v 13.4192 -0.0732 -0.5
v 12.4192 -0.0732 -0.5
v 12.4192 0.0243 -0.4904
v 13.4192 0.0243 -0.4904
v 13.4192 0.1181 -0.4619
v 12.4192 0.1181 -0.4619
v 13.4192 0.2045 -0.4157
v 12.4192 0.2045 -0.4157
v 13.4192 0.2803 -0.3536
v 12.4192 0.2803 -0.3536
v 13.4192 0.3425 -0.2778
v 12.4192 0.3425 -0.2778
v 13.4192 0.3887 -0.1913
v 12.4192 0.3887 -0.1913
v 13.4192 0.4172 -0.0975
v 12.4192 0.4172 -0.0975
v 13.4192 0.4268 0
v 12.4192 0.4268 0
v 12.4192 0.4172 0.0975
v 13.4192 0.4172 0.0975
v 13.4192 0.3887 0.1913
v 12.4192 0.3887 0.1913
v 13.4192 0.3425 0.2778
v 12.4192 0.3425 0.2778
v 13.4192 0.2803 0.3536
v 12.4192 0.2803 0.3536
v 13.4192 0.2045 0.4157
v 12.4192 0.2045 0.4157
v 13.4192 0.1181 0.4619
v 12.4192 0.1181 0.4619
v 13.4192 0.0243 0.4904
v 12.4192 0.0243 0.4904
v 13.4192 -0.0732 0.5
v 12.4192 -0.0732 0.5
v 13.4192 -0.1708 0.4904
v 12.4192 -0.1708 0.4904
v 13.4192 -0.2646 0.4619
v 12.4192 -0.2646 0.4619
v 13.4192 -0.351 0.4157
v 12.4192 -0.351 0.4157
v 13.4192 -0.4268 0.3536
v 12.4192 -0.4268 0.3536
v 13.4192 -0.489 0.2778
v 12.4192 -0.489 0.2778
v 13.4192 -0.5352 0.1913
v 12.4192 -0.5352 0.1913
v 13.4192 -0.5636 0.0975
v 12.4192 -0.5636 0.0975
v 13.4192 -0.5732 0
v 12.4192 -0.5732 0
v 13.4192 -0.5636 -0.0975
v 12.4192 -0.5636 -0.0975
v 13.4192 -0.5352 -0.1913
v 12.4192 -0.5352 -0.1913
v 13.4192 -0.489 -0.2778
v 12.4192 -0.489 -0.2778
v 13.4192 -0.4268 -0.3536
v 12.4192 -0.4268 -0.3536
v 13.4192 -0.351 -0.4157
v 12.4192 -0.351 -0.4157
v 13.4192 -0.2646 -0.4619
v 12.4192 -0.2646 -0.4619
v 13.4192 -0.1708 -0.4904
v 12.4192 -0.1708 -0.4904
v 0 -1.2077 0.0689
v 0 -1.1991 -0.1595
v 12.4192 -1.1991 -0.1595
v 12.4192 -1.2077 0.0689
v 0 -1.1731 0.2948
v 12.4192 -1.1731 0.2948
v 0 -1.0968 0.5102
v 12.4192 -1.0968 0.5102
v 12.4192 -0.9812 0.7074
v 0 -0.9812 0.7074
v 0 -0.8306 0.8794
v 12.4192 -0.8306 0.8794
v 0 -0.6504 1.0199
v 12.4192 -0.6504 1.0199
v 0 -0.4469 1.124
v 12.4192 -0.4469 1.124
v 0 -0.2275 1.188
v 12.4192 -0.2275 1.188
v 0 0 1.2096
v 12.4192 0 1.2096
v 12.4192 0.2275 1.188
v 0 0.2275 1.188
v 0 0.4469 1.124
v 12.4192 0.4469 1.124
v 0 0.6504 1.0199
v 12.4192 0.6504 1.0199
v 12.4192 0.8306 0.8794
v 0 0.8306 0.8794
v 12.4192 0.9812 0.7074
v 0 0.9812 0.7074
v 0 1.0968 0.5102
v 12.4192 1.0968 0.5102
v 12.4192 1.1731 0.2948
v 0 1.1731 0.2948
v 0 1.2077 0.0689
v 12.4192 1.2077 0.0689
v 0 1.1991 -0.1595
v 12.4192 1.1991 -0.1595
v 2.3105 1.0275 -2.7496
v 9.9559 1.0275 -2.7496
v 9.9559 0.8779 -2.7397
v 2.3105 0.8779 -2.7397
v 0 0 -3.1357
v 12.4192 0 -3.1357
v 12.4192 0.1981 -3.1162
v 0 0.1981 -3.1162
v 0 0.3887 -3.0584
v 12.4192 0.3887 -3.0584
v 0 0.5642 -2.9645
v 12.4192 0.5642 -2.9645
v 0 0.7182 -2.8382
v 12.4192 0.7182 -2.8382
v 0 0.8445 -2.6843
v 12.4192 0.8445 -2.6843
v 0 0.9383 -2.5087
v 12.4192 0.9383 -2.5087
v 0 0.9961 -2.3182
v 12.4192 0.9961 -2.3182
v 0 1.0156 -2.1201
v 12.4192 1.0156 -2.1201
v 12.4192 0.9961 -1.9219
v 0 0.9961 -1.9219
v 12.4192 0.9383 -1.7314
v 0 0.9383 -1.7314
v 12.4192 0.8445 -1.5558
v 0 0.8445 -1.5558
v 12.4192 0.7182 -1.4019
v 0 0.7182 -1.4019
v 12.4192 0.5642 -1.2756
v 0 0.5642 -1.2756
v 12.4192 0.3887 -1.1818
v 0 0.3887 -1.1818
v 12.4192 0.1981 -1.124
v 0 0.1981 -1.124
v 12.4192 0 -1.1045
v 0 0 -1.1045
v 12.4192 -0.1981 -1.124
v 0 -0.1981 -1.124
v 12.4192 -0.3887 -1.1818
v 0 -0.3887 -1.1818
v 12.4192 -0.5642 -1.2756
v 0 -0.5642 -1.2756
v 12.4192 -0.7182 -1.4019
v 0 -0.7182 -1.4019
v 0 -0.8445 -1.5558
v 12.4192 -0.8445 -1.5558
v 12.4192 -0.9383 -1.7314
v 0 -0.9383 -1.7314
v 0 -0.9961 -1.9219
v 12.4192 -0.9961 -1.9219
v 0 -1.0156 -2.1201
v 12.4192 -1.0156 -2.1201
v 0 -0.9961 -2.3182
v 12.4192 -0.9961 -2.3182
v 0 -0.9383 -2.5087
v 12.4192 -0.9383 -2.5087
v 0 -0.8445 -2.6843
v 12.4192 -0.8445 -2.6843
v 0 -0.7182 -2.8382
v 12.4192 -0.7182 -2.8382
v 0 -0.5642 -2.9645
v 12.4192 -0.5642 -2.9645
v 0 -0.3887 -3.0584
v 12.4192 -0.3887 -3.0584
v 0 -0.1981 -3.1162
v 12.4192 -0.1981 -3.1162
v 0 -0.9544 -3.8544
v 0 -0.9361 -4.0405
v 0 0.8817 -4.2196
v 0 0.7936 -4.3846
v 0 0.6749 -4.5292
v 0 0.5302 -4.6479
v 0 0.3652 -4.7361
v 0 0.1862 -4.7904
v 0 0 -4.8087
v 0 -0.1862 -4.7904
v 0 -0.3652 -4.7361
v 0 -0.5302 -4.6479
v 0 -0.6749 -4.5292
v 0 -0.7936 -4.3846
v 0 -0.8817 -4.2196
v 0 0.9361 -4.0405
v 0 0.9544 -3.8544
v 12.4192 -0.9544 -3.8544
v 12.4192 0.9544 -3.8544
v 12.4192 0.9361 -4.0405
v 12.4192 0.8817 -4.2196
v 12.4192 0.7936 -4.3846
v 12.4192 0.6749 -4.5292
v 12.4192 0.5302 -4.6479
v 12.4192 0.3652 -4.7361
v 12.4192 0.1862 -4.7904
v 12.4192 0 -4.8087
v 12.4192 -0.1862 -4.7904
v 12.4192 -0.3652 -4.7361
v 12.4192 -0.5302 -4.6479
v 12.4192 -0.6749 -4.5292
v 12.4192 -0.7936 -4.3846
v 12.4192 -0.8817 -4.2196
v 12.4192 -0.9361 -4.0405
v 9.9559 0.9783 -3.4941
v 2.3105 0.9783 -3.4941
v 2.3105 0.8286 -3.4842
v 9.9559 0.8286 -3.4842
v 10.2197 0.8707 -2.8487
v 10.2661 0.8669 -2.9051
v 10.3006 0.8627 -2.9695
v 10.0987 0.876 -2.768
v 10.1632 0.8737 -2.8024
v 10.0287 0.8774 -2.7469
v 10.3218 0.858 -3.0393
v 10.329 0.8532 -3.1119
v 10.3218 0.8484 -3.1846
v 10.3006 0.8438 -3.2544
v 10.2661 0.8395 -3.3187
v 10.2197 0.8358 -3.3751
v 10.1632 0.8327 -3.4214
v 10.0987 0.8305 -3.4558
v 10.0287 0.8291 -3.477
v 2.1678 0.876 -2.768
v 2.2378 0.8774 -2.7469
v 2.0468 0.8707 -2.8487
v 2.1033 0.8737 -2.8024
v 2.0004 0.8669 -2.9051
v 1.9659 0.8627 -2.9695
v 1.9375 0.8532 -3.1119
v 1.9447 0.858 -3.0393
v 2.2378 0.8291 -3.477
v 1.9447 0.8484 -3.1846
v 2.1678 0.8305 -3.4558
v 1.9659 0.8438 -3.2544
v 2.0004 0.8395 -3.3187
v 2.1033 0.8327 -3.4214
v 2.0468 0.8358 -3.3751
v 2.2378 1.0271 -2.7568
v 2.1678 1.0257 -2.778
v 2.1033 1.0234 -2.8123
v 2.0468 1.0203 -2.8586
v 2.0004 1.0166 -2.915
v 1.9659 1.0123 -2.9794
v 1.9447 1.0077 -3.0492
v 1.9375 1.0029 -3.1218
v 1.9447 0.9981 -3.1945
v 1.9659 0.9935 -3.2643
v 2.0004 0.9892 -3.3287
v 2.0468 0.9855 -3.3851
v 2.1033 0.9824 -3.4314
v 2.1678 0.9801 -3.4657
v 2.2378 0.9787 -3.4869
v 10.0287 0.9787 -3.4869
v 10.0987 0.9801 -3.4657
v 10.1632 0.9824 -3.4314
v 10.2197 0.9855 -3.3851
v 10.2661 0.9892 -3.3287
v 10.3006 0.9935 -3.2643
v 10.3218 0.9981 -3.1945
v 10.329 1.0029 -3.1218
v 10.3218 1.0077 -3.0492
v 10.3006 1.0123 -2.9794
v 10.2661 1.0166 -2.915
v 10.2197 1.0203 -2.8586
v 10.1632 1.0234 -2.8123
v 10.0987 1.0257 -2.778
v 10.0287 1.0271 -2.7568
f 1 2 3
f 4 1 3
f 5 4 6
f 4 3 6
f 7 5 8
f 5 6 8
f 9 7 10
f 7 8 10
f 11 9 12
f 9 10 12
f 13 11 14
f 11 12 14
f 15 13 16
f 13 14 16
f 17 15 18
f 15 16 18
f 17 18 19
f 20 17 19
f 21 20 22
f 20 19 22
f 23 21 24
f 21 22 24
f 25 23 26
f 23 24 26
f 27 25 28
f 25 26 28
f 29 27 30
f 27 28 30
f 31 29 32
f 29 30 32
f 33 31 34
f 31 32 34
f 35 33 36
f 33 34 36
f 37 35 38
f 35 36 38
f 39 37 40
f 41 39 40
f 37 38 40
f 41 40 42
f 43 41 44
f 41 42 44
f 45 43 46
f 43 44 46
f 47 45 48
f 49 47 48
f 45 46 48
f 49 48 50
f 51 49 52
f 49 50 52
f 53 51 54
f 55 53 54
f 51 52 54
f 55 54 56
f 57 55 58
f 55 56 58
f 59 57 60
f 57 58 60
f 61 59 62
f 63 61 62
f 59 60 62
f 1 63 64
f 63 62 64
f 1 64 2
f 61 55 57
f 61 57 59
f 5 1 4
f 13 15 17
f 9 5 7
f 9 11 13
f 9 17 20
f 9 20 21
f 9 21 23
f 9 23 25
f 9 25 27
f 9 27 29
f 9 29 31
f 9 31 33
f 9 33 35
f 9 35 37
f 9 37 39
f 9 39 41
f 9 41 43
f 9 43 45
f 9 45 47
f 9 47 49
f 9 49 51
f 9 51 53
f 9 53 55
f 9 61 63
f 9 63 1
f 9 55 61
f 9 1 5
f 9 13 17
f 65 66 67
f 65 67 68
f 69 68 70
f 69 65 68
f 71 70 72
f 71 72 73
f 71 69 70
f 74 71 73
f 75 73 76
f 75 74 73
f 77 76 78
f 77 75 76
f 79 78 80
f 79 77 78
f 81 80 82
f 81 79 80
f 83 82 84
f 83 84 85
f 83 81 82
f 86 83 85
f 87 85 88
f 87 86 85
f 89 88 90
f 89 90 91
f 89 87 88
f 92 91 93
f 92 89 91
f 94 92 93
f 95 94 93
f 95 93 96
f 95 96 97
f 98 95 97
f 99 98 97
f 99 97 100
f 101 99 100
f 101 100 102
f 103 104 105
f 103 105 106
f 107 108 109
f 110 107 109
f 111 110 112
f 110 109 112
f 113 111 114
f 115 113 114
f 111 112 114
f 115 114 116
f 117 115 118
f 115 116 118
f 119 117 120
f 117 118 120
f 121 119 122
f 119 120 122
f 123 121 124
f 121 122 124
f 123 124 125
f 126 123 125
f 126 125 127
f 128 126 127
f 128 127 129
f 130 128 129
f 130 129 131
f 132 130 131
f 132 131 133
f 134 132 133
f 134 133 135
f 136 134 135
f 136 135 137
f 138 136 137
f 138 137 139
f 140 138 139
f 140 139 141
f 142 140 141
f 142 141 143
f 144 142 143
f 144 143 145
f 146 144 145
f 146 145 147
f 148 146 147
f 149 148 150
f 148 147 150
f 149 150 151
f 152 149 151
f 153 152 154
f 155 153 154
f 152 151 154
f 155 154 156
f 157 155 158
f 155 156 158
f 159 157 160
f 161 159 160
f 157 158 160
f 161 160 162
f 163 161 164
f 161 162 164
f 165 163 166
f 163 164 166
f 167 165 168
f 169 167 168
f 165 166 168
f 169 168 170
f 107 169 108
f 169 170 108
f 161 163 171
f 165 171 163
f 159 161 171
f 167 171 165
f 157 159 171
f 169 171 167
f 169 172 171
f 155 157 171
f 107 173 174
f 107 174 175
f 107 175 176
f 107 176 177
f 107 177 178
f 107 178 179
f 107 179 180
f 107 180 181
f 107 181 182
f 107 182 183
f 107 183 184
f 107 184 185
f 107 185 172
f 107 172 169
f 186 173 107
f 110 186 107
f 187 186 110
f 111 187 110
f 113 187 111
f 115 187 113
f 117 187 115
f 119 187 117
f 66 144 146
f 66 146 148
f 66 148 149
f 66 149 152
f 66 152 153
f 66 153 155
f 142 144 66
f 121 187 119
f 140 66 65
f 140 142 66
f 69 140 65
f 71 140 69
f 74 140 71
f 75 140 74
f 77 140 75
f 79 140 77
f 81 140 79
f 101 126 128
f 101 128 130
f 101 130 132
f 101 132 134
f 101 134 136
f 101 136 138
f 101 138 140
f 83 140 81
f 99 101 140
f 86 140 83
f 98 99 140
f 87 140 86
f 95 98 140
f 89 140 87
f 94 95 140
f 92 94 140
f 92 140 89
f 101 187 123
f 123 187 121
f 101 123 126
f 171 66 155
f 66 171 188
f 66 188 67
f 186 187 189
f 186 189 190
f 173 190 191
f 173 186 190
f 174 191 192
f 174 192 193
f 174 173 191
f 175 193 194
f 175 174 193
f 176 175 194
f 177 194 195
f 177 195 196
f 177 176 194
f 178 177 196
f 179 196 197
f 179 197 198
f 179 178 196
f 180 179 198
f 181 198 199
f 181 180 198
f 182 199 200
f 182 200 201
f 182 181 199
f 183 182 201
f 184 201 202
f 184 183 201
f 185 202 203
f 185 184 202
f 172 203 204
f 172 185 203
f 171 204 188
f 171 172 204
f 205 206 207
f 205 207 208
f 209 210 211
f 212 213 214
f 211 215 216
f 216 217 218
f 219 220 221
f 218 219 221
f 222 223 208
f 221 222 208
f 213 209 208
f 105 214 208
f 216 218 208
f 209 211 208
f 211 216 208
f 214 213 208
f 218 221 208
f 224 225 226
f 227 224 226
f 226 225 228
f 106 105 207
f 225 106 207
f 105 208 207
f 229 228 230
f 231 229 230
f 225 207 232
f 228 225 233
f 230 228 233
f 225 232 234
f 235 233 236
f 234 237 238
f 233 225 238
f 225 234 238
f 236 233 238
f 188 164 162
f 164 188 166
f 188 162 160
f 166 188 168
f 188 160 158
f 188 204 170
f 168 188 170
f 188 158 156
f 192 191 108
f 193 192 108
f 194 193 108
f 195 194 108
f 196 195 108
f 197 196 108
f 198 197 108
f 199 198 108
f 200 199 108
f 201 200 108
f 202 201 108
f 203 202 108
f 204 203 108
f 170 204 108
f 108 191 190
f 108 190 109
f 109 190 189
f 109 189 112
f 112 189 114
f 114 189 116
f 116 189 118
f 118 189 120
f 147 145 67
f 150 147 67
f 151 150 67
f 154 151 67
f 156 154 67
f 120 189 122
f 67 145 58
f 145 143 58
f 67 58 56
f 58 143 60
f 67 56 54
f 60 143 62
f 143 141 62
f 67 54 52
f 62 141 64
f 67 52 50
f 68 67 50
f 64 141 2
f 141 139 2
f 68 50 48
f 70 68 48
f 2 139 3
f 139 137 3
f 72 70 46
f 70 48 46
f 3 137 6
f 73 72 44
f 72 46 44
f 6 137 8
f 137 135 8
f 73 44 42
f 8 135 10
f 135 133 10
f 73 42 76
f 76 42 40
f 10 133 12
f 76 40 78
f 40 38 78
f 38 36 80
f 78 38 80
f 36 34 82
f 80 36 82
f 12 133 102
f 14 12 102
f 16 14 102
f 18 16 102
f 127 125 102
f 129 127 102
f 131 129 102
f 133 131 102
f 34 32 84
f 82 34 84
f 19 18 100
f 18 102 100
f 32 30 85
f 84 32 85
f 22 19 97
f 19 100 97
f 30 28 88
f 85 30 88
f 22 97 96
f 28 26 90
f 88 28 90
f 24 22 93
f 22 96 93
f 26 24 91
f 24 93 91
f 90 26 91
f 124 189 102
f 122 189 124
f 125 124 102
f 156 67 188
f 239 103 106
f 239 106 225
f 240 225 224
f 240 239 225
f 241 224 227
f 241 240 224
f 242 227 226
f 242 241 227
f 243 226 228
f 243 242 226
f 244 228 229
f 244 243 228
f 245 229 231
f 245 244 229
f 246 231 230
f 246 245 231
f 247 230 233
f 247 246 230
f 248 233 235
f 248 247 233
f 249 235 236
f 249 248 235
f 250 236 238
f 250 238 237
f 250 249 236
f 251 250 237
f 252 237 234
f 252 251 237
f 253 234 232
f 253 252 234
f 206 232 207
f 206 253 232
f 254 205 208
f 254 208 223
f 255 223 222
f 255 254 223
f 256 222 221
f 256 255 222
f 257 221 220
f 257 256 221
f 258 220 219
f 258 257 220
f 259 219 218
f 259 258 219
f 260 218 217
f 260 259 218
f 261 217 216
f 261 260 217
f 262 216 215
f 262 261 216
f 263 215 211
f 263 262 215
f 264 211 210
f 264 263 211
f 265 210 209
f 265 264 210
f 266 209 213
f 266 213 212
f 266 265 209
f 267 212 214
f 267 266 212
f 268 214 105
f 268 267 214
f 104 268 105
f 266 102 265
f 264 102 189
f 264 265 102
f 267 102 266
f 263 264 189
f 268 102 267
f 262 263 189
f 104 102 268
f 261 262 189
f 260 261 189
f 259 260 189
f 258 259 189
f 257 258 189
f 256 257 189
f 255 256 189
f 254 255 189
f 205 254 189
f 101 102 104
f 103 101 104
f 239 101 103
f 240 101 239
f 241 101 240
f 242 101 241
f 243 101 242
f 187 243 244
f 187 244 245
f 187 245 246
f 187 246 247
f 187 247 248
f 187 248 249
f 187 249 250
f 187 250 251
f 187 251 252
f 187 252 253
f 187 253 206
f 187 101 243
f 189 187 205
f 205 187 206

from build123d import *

# Parameters (mm, degrees)
BOSS_EXTRUDE1_DEPTH = 12.419249514
SKETCH3_R           = 1.015618984
CUT_EXTRUDE1_DEPTH  = 13.419249514
SKETCH4_R           = 0.5
BOSS_EXTRUDE4_DEPTH = 1
CUT_EXTRUDE4_DEPTH  = 0.15


with BuildPart() as part:
    # Sketch2 → Boss-Extrude1 (new body)
    with BuildSketch(Plane(origin=(0, 0, 0), x_dir=(0, 0, -1), z_dir=(1, 0, 0))):
        with BuildLine():
            Line((0.159499861, 1.199062904), (3.854352819, 0.954395011))
            ThreePointArc((3.854352819, 0.954395011), (4.80874783, 0), (3.854352819, -0.954395011))
            Line((3.854352819, -0.954395011), (0.159499861, -1.199062904))
            ThreePointArc((0.159499861, -1.199062904), (-1.209624757, 0), (0.159499861, 1.199062904))
        make_face()
    extrude(amount=BOSS_EXTRUDE1_DEPTH)

    # Sketch3 → Cut-Extrude1 (cut)
    with BuildSketch(Plane(origin=(12.419249514, 0, 0), x_dir=(0, 0, -1), z_dir=(1, 0, 0))):
        with Locations((2.120083087, 0)):
            Circle(SKETCH3_R)
    extrude(amount=-CUT_EXTRUDE1_DEPTH, mode=Mode.SUBTRACT)

    # Sketch4 → Boss-Extrude4 (add)
    with BuildSketch(Plane(origin=(12.419249514, -0.073237878, 0), x_dir=(0, 0, -1), z_dir=(1, 0, 0))):
        Circle(SKETCH4_R)
    extrude(amount=BOSS_EXTRUDE4_DEPTH)

    # Sketch7 → Cut-Extrude4 (cut)
    with BuildSketch(Plane(origin=(0, 1.20434383, -0.079749931), x_dir=(1, 0, 0), z_dir=(0, 0.9978147342638661, -0.06607386840446525))):
        with BuildLine():
            Line((2.310540733, 3.421811002), (9.955936015, 3.421811002))
            ThreePointArc((9.955936015, 3.421811002), (10.328984883, 3.048762133), (9.955936015, 2.675713265))
            Line((9.955936015, 2.675713265), (2.310540733, 2.675713265))
            ThreePointArc((2.310540733, 2.675713265), (1.937491864, 3.048762133), (2.310540733, 3.421811002))
        make_face()
    extrude(amount=-CUT_EXTRUDE4_DEPTH, mode=Mode.SUBTRACT)


solid = part.part
